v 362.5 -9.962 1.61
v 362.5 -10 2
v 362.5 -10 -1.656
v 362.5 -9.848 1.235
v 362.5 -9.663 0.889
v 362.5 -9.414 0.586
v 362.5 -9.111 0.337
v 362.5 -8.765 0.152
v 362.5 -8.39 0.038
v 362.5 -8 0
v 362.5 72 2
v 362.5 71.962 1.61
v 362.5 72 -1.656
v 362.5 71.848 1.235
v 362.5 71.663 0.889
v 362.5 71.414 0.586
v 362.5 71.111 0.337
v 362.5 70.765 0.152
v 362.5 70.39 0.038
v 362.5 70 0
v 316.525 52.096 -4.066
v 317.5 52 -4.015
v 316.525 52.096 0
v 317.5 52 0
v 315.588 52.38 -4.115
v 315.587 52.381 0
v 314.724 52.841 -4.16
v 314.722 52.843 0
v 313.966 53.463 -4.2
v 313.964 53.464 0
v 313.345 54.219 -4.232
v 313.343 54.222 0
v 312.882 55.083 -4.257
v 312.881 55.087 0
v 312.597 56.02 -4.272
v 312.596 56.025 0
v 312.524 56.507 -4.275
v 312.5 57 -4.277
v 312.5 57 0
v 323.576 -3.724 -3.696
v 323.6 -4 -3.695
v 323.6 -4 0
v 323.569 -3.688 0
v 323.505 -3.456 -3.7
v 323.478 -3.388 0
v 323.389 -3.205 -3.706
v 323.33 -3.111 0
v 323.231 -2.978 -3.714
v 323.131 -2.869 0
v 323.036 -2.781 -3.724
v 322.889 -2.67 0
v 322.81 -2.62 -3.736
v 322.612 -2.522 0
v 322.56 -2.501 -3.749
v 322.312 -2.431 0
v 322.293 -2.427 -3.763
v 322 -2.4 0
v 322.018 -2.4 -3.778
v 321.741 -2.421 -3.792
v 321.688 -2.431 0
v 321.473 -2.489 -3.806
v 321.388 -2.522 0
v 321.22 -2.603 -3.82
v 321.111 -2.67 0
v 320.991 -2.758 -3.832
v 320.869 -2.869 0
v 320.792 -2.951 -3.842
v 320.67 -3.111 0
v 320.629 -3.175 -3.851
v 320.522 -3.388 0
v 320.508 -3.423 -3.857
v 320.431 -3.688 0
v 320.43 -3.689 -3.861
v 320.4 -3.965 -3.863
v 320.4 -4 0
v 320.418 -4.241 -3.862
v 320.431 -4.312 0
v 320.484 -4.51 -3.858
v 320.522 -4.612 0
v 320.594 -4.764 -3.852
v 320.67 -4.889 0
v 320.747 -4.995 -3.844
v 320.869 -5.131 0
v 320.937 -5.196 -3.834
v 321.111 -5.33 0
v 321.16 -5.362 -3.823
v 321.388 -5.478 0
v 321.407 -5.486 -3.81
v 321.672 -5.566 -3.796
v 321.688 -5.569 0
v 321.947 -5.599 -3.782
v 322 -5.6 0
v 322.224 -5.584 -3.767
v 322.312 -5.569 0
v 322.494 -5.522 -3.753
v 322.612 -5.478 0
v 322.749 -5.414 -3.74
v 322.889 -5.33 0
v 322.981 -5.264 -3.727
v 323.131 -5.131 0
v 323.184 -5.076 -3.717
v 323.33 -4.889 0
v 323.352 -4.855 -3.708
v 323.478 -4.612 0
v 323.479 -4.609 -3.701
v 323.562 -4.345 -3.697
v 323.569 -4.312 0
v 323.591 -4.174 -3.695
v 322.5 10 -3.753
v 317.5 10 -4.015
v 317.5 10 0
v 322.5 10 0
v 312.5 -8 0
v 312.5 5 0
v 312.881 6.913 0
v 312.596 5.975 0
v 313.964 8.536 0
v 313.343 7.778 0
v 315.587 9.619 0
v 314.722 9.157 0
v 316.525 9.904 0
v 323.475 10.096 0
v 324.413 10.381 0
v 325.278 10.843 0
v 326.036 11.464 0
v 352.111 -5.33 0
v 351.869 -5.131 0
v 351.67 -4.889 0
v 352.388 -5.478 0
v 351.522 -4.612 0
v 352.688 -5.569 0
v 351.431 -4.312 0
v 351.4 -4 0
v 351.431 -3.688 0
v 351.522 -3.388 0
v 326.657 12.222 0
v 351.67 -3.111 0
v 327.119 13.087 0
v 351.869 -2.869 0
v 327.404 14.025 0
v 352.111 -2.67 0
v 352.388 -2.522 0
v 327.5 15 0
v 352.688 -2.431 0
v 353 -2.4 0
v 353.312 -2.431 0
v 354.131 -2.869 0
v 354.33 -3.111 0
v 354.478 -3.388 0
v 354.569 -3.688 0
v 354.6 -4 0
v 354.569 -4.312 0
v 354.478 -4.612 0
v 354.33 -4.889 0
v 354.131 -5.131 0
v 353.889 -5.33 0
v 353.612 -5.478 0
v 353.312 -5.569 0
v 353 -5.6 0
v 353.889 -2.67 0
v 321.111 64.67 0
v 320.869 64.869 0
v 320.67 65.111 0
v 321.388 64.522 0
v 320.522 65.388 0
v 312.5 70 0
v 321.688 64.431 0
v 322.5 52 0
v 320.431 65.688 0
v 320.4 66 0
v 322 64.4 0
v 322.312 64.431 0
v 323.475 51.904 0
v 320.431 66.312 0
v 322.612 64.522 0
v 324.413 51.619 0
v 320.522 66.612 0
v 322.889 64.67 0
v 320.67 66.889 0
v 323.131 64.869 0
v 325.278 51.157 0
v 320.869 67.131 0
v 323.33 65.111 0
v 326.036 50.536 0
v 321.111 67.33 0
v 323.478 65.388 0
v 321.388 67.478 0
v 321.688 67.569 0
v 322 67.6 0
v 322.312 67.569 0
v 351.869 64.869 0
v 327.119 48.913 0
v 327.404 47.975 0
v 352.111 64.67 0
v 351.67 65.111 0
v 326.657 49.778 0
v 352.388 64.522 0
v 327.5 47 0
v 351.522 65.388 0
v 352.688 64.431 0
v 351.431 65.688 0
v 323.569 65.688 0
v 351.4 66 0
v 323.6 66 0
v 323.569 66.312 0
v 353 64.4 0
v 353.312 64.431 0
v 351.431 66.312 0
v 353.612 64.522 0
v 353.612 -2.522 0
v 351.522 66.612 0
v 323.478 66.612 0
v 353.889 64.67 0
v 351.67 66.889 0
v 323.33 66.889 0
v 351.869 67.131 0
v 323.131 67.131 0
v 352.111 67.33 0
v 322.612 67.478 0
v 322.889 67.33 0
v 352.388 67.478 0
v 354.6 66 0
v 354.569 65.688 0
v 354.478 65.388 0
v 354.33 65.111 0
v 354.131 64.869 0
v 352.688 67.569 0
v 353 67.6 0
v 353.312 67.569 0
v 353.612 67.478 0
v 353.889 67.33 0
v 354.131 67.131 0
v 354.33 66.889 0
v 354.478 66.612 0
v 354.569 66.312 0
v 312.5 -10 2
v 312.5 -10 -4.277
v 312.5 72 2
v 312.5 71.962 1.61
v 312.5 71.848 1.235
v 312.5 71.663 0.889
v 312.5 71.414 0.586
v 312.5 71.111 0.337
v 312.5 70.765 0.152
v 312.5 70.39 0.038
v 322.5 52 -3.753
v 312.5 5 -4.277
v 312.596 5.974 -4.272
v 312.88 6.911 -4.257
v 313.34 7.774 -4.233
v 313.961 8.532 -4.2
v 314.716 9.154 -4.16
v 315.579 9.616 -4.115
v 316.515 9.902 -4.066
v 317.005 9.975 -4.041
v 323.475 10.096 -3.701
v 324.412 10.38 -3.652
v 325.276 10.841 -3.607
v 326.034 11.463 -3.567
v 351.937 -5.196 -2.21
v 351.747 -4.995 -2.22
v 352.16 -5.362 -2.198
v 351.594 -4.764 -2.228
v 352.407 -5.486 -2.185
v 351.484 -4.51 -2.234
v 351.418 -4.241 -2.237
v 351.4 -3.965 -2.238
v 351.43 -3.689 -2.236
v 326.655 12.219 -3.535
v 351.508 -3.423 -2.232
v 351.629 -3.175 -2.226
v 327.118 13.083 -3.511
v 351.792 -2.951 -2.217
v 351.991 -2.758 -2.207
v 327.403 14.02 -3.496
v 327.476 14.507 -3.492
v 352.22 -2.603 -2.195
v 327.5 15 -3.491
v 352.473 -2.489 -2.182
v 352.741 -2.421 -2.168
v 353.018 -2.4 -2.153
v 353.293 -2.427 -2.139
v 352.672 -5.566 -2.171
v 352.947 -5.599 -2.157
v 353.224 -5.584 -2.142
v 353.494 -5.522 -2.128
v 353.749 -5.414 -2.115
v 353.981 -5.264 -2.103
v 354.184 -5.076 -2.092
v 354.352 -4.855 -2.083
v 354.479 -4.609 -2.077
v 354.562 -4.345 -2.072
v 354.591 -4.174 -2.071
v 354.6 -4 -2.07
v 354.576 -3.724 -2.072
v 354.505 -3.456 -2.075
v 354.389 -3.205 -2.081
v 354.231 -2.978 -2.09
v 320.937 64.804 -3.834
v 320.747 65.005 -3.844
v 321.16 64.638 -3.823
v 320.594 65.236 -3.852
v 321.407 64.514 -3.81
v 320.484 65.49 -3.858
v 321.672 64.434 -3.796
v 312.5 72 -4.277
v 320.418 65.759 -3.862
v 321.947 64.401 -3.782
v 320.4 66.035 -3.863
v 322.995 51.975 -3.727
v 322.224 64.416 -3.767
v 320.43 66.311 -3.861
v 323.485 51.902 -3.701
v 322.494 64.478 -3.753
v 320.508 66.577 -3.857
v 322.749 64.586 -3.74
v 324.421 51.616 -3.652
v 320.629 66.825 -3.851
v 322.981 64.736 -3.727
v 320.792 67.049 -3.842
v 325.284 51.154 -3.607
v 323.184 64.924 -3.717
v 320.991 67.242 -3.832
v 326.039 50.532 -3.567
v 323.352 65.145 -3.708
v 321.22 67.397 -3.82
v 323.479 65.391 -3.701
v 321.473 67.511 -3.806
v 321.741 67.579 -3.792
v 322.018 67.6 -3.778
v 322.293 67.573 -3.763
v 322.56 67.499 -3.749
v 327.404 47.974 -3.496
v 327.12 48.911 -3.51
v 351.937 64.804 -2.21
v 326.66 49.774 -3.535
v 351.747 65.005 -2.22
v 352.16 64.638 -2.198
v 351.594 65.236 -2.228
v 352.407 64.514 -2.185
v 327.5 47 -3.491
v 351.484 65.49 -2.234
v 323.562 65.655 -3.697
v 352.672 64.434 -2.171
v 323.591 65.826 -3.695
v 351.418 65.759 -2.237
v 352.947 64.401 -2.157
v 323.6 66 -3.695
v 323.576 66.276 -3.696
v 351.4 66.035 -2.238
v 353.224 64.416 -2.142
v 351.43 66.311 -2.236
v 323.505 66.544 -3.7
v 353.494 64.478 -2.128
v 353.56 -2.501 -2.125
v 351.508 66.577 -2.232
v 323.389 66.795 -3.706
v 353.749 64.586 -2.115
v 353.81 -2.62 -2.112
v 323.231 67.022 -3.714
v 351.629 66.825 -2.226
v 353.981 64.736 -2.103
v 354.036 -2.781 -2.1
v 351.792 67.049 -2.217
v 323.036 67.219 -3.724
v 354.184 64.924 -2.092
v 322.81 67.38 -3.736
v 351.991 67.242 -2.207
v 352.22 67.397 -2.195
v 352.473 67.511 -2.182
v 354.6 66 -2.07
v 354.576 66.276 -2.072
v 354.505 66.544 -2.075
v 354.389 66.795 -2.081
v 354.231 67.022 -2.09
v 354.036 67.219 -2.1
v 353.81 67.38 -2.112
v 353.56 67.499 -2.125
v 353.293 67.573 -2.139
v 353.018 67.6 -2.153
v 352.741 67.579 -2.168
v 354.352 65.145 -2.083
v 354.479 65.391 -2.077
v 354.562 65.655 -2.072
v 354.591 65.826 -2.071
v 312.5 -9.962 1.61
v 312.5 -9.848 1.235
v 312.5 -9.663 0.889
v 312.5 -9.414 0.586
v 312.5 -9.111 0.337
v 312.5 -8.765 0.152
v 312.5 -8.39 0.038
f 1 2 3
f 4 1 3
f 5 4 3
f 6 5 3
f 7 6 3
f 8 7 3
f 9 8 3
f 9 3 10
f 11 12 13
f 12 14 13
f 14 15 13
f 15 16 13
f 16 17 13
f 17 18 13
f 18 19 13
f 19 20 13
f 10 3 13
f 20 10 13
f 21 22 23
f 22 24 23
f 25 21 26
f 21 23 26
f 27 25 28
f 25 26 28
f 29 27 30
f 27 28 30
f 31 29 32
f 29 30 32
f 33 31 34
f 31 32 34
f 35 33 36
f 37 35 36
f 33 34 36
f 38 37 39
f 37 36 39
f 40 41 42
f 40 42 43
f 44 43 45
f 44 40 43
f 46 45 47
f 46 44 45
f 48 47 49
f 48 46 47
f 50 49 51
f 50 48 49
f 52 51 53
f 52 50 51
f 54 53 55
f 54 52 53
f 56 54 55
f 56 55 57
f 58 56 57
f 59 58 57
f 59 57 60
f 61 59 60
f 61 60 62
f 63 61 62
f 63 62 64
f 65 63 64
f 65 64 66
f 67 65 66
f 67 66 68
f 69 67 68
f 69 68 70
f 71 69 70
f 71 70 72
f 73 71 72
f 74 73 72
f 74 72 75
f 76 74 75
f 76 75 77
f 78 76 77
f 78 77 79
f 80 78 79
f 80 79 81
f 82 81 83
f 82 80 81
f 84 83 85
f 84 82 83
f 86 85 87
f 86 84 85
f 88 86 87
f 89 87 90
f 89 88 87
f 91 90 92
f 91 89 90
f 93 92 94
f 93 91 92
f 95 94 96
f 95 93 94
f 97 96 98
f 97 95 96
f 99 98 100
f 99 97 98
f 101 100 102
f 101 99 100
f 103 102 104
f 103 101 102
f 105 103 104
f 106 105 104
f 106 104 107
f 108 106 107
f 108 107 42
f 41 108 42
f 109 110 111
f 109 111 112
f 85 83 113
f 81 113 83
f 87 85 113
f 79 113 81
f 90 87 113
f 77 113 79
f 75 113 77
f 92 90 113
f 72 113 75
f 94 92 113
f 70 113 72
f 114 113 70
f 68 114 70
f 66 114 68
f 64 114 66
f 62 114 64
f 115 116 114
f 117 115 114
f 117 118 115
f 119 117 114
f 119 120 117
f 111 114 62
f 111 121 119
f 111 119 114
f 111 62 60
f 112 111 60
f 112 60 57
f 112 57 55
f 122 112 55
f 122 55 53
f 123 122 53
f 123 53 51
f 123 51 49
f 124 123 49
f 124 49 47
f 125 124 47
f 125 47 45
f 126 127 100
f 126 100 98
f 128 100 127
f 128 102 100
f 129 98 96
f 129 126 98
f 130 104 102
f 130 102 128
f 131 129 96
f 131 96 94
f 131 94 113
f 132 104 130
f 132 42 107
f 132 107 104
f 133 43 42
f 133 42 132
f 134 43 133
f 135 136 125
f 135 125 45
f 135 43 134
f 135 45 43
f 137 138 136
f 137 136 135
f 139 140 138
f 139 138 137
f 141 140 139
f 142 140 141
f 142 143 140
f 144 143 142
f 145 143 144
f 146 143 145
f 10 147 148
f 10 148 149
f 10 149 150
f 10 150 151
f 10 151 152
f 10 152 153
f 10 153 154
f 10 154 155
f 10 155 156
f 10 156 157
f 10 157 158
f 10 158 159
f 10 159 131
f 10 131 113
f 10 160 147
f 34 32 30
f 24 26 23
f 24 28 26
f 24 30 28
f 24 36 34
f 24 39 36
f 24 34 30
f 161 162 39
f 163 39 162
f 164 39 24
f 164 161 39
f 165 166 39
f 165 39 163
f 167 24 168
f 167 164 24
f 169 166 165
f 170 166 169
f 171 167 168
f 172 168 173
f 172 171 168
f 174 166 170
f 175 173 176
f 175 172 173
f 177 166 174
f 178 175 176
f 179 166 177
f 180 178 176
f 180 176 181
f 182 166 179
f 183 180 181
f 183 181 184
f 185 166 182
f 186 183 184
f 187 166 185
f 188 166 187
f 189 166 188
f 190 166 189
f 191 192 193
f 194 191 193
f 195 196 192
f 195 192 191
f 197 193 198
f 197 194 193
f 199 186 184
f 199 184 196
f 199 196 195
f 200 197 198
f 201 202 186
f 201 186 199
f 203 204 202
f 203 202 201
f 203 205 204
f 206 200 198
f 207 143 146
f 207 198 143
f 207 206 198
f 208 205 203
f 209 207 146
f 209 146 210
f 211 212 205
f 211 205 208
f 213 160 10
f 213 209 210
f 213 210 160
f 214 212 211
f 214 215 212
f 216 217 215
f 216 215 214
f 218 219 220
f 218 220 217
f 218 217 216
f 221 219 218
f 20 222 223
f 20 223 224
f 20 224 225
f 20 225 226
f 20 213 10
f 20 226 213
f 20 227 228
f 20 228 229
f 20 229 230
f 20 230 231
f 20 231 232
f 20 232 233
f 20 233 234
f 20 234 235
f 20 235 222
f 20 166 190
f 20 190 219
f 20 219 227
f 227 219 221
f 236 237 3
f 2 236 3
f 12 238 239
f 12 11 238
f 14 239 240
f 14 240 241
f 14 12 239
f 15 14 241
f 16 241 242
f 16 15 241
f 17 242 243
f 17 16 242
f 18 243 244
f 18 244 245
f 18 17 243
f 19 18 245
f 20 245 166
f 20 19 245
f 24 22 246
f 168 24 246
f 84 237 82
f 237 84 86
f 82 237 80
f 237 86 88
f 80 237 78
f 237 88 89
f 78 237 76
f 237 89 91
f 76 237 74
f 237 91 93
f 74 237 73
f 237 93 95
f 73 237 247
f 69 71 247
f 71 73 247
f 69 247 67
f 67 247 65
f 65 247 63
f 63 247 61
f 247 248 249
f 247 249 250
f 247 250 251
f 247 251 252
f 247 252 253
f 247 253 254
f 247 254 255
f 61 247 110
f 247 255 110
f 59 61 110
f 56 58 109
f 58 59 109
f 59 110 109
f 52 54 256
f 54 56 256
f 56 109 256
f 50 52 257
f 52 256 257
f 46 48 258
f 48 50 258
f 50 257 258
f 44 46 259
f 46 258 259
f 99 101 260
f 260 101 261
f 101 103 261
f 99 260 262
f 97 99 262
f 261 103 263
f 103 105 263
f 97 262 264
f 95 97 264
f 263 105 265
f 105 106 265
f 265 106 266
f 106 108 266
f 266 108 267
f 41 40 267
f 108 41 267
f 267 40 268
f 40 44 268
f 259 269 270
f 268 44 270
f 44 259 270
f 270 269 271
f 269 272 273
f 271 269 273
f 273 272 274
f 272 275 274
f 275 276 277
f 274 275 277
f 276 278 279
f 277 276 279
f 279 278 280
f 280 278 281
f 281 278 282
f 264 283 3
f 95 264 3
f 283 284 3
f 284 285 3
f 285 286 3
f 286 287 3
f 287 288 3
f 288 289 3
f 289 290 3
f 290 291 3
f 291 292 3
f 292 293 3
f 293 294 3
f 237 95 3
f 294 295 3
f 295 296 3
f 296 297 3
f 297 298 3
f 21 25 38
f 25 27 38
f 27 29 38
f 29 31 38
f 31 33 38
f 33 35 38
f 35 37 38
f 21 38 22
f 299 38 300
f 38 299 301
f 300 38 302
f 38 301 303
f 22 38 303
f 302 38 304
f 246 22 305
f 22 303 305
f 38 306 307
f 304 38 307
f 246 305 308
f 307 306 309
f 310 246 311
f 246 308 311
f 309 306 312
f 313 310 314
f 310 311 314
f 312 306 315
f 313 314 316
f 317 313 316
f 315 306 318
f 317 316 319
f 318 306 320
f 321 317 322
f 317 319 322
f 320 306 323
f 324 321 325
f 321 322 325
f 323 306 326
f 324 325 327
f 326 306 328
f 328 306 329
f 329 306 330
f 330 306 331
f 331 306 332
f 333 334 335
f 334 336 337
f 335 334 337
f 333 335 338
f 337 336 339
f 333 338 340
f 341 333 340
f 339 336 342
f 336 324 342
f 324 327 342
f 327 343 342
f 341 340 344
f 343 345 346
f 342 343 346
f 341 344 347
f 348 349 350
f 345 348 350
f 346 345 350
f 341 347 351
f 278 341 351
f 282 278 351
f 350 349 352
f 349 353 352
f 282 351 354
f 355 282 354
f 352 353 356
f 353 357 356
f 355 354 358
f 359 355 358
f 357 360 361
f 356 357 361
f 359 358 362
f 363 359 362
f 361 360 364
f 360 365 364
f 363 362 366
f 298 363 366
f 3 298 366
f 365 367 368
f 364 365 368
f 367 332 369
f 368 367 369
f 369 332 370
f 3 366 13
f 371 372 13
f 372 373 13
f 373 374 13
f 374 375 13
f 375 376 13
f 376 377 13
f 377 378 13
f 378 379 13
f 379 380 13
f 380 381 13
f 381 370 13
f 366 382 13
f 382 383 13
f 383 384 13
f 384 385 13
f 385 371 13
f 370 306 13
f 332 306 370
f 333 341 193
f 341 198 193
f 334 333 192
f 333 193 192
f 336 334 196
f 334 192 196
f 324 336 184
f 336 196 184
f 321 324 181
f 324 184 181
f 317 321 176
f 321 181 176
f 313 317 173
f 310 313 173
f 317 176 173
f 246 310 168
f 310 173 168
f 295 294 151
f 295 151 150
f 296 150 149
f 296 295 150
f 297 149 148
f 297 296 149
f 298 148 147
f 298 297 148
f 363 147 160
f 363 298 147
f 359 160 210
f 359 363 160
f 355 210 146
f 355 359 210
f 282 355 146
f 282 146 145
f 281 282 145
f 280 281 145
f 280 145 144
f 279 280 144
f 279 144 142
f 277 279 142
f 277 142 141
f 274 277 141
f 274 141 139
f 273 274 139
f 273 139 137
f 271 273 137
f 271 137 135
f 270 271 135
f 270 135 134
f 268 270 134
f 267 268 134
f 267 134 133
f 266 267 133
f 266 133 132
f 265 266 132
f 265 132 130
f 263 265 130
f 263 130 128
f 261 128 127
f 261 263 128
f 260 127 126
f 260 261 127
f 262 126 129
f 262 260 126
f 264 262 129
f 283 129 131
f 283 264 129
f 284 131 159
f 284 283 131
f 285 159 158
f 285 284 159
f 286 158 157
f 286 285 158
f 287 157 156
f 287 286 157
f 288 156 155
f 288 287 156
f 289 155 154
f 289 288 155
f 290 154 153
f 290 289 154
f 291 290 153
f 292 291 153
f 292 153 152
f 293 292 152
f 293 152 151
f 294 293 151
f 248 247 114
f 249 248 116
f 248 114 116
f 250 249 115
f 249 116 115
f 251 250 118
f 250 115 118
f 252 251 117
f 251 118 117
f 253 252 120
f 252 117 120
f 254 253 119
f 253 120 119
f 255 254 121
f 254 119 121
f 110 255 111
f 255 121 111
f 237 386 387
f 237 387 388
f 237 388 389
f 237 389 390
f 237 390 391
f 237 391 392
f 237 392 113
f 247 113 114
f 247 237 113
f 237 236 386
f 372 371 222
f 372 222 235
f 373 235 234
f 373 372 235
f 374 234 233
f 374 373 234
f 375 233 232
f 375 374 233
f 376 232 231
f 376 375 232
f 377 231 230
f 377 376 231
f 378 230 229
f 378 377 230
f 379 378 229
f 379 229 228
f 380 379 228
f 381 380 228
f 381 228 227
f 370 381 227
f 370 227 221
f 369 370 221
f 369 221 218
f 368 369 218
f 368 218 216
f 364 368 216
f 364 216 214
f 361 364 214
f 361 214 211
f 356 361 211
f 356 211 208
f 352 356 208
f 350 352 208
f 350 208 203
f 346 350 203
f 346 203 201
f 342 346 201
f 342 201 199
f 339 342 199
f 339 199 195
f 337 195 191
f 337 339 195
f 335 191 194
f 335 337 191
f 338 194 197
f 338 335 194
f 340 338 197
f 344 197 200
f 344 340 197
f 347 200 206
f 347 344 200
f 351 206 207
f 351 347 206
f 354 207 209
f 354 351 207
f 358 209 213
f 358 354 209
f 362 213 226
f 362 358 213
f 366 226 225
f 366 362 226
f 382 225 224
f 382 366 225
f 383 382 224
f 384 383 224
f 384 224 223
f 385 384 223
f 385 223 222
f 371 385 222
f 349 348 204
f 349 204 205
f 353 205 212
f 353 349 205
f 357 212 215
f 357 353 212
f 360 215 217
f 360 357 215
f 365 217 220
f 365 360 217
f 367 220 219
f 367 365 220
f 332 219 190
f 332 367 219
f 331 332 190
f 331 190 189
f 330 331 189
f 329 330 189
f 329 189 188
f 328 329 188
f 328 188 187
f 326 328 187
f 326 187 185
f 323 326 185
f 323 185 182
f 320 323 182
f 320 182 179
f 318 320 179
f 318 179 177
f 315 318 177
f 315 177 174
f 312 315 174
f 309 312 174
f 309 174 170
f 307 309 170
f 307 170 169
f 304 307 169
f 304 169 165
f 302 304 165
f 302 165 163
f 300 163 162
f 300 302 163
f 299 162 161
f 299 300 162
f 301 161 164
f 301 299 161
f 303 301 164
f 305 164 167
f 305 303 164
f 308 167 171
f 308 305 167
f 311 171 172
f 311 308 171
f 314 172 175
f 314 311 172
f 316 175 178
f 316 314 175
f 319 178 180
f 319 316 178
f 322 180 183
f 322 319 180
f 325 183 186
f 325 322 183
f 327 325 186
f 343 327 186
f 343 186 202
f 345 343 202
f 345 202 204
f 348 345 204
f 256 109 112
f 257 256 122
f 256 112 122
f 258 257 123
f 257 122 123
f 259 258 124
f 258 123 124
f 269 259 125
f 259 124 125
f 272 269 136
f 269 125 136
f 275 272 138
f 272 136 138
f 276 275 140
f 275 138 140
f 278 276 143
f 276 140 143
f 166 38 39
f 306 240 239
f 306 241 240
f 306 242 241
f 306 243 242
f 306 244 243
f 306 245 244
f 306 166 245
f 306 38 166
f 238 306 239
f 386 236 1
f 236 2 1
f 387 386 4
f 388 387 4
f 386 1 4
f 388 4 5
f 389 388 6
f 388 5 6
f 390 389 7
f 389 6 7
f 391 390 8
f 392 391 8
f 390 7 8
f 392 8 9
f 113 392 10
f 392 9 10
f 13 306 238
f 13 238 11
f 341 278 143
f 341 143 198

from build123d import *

# Parameters (mm, degrees)
CYLINDER397_R          = 1.6
CYLINDER397_DEPTH      = 10
CYLINDER398_R          = 1.6
CYLINDER398_DEPTH      = 10
CYLINDER399_R          = 1.6
CYLINDER399_DEPTH      = 10
CYLINDER400_R          = 1.6
CYLINDER400_DEPTH      = 10
BOX271_W               = 15
BOX271_H               = 42
BOX271_DEPTH           = 20
BOX270_W               = 50
BOX270_H               = 82
BOX270_DEPTH           = 20
FILLET104_R            = 2
BOX268_W               = 58
BOX268_H               = 82
BOX268_DEPTH           = 10
BOX268_PLACEMENT_ANGLE = 3
BOX269_W               = 50
BOX269_H               = 82
BOX269_DEPTH           = 22
FILLET105_R            = 5


with BuildPart() as cylinder397:
    # Cylinder397 → Cylinder397 (new body)
    with BuildSketch(Plane(origin=(320, -4, -6), x_dir=(1, 0, 0), z_dir=(0, 0, 1))):
        Circle(CYLINDER397_R)
    extrude(amount=CYLINDER397_DEPTH)


with BuildPart() as fusion344:
    # Cylinder398 → Cylinder398 (new body)
    with BuildSketch(Plane(origin=(320, 66, -6), x_dir=(1, 0, 0), z_dir=(0, 0, 1))):
        Circle(CYLINDER398_R)
    extrude(amount=CYLINDER398_DEPTH)

    # Fusion344: union Cylinder397
    add(cylinder397.part)


with BuildPart() as fusion344_1:
    # Fusion344 placement: moved
    add(fusion344.part.moved(Location((2, 0, 0))))


with BuildPart() as cylinder399:
    # Cylinder399 → Cylinder399 (new body)
    with BuildSketch(Plane(origin=(320, -4, -6), x_dir=(1, 0, 0), z_dir=(0, 0, 1))):
        Circle(CYLINDER399_R)
    extrude(amount=CYLINDER399_DEPTH)


with BuildPart() as fusion346:
    # Cylinder400 → Cylinder400 (new body)
    with BuildSketch(Plane(origin=(320, 66, -6), x_dir=(1, 0, 0), z_dir=(0, 0, 1))):
        Circle(CYLINDER400_R)
    extrude(amount=CYLINDER400_DEPTH)

    # Fusion345: union Cylinder399
    add(cylinder399.part)


with BuildPart() as fusion346_1:
    # Fusion345 placement: moved
    add(fusion346.part.moved(Location((33, 0, 0))))

    # Fusion346: union Fusion344
    add(fusion344_1.part)


with BuildPart() as cube351:
    # Box271 → Box271 (new body)
    with BuildSketch(Plane(origin=(312.5, 10, -5), x_dir=(1, 0, 0), z_dir=(0, 0, 1))):
        with Locations((7.5, 21)):
            Rectangle(BOX271_W, BOX271_H)
    extrude(amount=BOX271_DEPTH)


with BuildPart() as fillet104:
    # Box270 → Box270 (new body)
    with BuildSketch(Plane(origin=(312.5, 0, 0), x_dir=(1, 0, 0), z_dir=(0, 0, 1))):
        with Locations((25, 41)):
            Rectangle(BOX270_W, BOX270_H)
    extrude(amount=BOX270_DEPTH)

    # Fillet104
    fillet104_edges = [fillet104.edges().sort_by_distance(p)[0] for p in [
        (337.5, 0, 0),
        (337.5, 82, 0),
    ]]
    fillet(fillet104_edges, radius=FILLET104_R)


with BuildPart() as fillet104_1:
    # Fillet104 placement: moved
    add(fillet104.part.moved(Location((0, -10, 0))))


with BuildPart() as cube348:
    # Box268 → Box268 (new body)
    with BuildSketch(Plane.XY):
        with Locations((29, 41)):
            Rectangle(BOX268_W, BOX268_H)
    extrude(amount=BOX268_DEPTH)


with BuildPart() as cube348_1:
    # Box268 placement: moved
    add(cube348.part.moved(Location((308.5, -10, -14.5))).rotate(Axis((308.5, -10, -14.5), (0, -1, 0)), BOX268_PLACEMENT_ANGLE))


with BuildPart() as battery_box_holder_wide:
    # Box269 → Box269 (new body)
    with BuildSketch(Plane(origin=(312.5, -10, -5), x_dir=(1, 0, 0), z_dir=(0, 0, 1))):
        with Locations((25, 41)):
            Rectangle(BOX269_W, BOX269_H)
    extrude(amount=BOX269_DEPTH)

    # Cut281: cut Cube348
    add(cube348_1.part, mode=Mode.SUBTRACT)

    # Cut282: cut Fillet104
    add(fillet104_1.part, mode=Mode.SUBTRACT)

    # Cut283: cut Cube351
    add(cube351.part, mode=Mode.SUBTRACT)

    # Cut284: cut Fusion346
    add(fusion346_1.part, mode=Mode.SUBTRACT)

    # Fillet105
    fillet105_edges = [battery_box_holder_wide.edges().sort_by_distance(p)[0] for p in [
        (312.5, 10, -2.138323),
        (327.5, 10, -1.745264),
        (327.5, 52, -1.745264),
        (312.5, 52, -2.138323),
    ]]
    fillet(fillet105_edges, radius=FILLET105_R)


solid = battery_box_holder_wide.part
